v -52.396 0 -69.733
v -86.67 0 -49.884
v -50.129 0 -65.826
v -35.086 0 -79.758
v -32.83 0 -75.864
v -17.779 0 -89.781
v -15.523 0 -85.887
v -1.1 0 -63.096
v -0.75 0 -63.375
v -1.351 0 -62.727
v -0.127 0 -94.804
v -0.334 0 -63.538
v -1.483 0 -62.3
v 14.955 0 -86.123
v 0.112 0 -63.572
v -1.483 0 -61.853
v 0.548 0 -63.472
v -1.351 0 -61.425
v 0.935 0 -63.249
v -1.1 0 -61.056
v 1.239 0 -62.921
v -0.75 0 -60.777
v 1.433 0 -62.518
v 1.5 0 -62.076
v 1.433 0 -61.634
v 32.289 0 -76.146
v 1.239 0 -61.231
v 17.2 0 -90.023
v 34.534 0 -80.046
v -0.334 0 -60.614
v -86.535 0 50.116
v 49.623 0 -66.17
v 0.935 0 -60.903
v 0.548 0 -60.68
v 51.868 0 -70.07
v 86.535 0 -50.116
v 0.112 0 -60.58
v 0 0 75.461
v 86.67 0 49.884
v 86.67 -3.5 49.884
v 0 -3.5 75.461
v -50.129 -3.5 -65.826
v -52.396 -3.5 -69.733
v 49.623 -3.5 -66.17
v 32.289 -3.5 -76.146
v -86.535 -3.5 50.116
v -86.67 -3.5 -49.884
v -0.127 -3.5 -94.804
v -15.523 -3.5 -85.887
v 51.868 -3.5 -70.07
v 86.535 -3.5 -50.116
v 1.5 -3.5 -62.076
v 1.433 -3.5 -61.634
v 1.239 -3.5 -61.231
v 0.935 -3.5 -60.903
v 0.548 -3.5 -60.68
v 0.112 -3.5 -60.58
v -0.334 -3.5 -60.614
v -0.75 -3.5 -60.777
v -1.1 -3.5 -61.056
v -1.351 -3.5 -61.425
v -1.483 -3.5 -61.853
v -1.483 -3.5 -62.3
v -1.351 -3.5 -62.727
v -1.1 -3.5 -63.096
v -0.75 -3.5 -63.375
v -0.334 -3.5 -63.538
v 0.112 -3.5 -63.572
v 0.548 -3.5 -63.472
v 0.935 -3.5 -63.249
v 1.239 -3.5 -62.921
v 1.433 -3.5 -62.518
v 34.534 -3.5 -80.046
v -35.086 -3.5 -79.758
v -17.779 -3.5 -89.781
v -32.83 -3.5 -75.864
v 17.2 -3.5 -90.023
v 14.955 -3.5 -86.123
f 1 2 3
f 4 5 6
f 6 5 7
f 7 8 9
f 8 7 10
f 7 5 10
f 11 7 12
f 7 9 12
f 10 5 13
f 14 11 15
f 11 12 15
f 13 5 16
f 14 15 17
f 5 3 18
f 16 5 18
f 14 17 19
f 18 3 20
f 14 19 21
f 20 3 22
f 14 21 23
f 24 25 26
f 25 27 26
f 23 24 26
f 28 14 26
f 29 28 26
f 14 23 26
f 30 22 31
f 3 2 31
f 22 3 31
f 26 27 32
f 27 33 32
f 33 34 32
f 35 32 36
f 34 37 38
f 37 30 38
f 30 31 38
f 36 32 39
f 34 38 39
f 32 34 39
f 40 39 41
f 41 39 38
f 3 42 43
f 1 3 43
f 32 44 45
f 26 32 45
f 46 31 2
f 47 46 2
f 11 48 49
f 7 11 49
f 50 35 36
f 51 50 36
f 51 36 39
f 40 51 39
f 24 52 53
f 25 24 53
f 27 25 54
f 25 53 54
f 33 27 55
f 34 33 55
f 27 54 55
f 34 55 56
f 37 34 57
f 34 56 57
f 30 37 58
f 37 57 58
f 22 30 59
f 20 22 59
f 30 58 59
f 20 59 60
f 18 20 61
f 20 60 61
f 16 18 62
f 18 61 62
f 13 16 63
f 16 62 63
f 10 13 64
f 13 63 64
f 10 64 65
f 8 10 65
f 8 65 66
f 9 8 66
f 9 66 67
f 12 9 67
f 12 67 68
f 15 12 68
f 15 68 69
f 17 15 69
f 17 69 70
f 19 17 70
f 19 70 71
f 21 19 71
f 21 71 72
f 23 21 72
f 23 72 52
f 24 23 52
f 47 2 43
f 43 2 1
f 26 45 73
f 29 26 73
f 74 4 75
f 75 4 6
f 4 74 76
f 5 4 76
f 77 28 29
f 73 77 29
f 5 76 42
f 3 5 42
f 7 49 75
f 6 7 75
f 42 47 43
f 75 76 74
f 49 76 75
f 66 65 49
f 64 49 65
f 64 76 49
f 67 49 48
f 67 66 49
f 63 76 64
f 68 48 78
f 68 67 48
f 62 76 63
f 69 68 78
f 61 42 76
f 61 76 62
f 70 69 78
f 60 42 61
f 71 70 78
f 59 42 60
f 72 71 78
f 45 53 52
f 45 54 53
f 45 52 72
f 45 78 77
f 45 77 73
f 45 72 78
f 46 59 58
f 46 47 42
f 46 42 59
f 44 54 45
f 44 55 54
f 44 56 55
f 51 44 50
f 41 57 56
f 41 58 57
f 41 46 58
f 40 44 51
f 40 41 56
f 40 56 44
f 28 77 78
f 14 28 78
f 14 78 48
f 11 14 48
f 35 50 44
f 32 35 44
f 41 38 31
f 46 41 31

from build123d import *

# Parameters (mm, degrees)
F1_DEPTH = 3.5
F2_R     = 1.5
F3_DEPTH = 25


# Not quite as in the source:
# - a feature names something its author has since deleted; it is built from what else it names


with BuildPart() as f1:
    # F0 (on Front) → F1 (new body)
    with BuildSketch(Plane.XZ):
        Polygon((0, 75.4606574774), (-86.5353767039, 50.1161508768), (-86.6695481512, -49.8837591133), (-0.1341714472, -99.9999099901), (86.5353767039, -50.1161508768), (86.6695481512, 49.8837591133), align=None)
    extrude(amount=F1_DEPTH)

    # F2 (on face) → F3 (cut)
    with BuildSketch(Plane.XZ.offset(3.5)):
        Polygon((0.1341714472, 99.9999099901), (-17.199738183, 90.0231581674), (-14.9549690229, 86.1230285006), (0.1271996943, 94.8037622444), (-2.1236443549, 96.1073174408), align=None)
        Polygon((17.4386577754, 89.9781792171), (0.1341714472, 99.9999099901), (2.3789406073, 96.0997803233), (0.1271996943, 94.8037622444), (15.1834309859, 86.0840872654), align=None)
        Polygon((2.3789406073, 96.0997803233), (0.1341714472, 99.9999099901), (-2.1236443549, 96.1073174408), (0.1271996943, 94.8037622444), align=None)
        Polygon((-50.1288800257, -65.8258142354), (-52.3961295985, -69.7328876509), (-35.0856874223, -79.7580676974), (-32.8304606328, -75.8639757457), align=None)
        Polygon((-15.5233852921, -85.8872059211), (-17.7786120815, -89.7812978727), (-0.4715367407, -99.8045280481), (-0.3587329239, -99.6097501051), (-2.3789406073, -96.0997803233), (-0.1271996943, -94.8037622444), align=None)
        Polygon((-0.3587329239, -99.6097501051), (-0.4715367407, -99.8045280481), (-0.1341714472, -99.9999099901), align=None)
        Polygon((14.9549690229, -86.1230285006), (-0.1271996943, -94.8037622444), (1.7836900487, -95.9104360964), (-0.3587329239, -99.6097501051), (-0.1341714472, -99.9999099901), (17.199738183, -90.0231581674), align=None)
        Polygon((1.7836900487, -95.9104360964), (-0.1271996943, -94.8037622444), (-2.3789406073, -96.0997803233), (-0.3587329239, -99.6097501051), align=None)
        Polygon((34.5336478132, -80.0464063448), (51.8675574435, -70.0696545221), (49.6227882834, -66.1695248553), (32.2888786531, -76.146276678), align=None)
        with Locations((0, -62.0760797054)):
            Circle(F2_R)
    extrude(amount=-F3_DEPTH, mode=Mode.SUBTRACT)


solid = f1.part
